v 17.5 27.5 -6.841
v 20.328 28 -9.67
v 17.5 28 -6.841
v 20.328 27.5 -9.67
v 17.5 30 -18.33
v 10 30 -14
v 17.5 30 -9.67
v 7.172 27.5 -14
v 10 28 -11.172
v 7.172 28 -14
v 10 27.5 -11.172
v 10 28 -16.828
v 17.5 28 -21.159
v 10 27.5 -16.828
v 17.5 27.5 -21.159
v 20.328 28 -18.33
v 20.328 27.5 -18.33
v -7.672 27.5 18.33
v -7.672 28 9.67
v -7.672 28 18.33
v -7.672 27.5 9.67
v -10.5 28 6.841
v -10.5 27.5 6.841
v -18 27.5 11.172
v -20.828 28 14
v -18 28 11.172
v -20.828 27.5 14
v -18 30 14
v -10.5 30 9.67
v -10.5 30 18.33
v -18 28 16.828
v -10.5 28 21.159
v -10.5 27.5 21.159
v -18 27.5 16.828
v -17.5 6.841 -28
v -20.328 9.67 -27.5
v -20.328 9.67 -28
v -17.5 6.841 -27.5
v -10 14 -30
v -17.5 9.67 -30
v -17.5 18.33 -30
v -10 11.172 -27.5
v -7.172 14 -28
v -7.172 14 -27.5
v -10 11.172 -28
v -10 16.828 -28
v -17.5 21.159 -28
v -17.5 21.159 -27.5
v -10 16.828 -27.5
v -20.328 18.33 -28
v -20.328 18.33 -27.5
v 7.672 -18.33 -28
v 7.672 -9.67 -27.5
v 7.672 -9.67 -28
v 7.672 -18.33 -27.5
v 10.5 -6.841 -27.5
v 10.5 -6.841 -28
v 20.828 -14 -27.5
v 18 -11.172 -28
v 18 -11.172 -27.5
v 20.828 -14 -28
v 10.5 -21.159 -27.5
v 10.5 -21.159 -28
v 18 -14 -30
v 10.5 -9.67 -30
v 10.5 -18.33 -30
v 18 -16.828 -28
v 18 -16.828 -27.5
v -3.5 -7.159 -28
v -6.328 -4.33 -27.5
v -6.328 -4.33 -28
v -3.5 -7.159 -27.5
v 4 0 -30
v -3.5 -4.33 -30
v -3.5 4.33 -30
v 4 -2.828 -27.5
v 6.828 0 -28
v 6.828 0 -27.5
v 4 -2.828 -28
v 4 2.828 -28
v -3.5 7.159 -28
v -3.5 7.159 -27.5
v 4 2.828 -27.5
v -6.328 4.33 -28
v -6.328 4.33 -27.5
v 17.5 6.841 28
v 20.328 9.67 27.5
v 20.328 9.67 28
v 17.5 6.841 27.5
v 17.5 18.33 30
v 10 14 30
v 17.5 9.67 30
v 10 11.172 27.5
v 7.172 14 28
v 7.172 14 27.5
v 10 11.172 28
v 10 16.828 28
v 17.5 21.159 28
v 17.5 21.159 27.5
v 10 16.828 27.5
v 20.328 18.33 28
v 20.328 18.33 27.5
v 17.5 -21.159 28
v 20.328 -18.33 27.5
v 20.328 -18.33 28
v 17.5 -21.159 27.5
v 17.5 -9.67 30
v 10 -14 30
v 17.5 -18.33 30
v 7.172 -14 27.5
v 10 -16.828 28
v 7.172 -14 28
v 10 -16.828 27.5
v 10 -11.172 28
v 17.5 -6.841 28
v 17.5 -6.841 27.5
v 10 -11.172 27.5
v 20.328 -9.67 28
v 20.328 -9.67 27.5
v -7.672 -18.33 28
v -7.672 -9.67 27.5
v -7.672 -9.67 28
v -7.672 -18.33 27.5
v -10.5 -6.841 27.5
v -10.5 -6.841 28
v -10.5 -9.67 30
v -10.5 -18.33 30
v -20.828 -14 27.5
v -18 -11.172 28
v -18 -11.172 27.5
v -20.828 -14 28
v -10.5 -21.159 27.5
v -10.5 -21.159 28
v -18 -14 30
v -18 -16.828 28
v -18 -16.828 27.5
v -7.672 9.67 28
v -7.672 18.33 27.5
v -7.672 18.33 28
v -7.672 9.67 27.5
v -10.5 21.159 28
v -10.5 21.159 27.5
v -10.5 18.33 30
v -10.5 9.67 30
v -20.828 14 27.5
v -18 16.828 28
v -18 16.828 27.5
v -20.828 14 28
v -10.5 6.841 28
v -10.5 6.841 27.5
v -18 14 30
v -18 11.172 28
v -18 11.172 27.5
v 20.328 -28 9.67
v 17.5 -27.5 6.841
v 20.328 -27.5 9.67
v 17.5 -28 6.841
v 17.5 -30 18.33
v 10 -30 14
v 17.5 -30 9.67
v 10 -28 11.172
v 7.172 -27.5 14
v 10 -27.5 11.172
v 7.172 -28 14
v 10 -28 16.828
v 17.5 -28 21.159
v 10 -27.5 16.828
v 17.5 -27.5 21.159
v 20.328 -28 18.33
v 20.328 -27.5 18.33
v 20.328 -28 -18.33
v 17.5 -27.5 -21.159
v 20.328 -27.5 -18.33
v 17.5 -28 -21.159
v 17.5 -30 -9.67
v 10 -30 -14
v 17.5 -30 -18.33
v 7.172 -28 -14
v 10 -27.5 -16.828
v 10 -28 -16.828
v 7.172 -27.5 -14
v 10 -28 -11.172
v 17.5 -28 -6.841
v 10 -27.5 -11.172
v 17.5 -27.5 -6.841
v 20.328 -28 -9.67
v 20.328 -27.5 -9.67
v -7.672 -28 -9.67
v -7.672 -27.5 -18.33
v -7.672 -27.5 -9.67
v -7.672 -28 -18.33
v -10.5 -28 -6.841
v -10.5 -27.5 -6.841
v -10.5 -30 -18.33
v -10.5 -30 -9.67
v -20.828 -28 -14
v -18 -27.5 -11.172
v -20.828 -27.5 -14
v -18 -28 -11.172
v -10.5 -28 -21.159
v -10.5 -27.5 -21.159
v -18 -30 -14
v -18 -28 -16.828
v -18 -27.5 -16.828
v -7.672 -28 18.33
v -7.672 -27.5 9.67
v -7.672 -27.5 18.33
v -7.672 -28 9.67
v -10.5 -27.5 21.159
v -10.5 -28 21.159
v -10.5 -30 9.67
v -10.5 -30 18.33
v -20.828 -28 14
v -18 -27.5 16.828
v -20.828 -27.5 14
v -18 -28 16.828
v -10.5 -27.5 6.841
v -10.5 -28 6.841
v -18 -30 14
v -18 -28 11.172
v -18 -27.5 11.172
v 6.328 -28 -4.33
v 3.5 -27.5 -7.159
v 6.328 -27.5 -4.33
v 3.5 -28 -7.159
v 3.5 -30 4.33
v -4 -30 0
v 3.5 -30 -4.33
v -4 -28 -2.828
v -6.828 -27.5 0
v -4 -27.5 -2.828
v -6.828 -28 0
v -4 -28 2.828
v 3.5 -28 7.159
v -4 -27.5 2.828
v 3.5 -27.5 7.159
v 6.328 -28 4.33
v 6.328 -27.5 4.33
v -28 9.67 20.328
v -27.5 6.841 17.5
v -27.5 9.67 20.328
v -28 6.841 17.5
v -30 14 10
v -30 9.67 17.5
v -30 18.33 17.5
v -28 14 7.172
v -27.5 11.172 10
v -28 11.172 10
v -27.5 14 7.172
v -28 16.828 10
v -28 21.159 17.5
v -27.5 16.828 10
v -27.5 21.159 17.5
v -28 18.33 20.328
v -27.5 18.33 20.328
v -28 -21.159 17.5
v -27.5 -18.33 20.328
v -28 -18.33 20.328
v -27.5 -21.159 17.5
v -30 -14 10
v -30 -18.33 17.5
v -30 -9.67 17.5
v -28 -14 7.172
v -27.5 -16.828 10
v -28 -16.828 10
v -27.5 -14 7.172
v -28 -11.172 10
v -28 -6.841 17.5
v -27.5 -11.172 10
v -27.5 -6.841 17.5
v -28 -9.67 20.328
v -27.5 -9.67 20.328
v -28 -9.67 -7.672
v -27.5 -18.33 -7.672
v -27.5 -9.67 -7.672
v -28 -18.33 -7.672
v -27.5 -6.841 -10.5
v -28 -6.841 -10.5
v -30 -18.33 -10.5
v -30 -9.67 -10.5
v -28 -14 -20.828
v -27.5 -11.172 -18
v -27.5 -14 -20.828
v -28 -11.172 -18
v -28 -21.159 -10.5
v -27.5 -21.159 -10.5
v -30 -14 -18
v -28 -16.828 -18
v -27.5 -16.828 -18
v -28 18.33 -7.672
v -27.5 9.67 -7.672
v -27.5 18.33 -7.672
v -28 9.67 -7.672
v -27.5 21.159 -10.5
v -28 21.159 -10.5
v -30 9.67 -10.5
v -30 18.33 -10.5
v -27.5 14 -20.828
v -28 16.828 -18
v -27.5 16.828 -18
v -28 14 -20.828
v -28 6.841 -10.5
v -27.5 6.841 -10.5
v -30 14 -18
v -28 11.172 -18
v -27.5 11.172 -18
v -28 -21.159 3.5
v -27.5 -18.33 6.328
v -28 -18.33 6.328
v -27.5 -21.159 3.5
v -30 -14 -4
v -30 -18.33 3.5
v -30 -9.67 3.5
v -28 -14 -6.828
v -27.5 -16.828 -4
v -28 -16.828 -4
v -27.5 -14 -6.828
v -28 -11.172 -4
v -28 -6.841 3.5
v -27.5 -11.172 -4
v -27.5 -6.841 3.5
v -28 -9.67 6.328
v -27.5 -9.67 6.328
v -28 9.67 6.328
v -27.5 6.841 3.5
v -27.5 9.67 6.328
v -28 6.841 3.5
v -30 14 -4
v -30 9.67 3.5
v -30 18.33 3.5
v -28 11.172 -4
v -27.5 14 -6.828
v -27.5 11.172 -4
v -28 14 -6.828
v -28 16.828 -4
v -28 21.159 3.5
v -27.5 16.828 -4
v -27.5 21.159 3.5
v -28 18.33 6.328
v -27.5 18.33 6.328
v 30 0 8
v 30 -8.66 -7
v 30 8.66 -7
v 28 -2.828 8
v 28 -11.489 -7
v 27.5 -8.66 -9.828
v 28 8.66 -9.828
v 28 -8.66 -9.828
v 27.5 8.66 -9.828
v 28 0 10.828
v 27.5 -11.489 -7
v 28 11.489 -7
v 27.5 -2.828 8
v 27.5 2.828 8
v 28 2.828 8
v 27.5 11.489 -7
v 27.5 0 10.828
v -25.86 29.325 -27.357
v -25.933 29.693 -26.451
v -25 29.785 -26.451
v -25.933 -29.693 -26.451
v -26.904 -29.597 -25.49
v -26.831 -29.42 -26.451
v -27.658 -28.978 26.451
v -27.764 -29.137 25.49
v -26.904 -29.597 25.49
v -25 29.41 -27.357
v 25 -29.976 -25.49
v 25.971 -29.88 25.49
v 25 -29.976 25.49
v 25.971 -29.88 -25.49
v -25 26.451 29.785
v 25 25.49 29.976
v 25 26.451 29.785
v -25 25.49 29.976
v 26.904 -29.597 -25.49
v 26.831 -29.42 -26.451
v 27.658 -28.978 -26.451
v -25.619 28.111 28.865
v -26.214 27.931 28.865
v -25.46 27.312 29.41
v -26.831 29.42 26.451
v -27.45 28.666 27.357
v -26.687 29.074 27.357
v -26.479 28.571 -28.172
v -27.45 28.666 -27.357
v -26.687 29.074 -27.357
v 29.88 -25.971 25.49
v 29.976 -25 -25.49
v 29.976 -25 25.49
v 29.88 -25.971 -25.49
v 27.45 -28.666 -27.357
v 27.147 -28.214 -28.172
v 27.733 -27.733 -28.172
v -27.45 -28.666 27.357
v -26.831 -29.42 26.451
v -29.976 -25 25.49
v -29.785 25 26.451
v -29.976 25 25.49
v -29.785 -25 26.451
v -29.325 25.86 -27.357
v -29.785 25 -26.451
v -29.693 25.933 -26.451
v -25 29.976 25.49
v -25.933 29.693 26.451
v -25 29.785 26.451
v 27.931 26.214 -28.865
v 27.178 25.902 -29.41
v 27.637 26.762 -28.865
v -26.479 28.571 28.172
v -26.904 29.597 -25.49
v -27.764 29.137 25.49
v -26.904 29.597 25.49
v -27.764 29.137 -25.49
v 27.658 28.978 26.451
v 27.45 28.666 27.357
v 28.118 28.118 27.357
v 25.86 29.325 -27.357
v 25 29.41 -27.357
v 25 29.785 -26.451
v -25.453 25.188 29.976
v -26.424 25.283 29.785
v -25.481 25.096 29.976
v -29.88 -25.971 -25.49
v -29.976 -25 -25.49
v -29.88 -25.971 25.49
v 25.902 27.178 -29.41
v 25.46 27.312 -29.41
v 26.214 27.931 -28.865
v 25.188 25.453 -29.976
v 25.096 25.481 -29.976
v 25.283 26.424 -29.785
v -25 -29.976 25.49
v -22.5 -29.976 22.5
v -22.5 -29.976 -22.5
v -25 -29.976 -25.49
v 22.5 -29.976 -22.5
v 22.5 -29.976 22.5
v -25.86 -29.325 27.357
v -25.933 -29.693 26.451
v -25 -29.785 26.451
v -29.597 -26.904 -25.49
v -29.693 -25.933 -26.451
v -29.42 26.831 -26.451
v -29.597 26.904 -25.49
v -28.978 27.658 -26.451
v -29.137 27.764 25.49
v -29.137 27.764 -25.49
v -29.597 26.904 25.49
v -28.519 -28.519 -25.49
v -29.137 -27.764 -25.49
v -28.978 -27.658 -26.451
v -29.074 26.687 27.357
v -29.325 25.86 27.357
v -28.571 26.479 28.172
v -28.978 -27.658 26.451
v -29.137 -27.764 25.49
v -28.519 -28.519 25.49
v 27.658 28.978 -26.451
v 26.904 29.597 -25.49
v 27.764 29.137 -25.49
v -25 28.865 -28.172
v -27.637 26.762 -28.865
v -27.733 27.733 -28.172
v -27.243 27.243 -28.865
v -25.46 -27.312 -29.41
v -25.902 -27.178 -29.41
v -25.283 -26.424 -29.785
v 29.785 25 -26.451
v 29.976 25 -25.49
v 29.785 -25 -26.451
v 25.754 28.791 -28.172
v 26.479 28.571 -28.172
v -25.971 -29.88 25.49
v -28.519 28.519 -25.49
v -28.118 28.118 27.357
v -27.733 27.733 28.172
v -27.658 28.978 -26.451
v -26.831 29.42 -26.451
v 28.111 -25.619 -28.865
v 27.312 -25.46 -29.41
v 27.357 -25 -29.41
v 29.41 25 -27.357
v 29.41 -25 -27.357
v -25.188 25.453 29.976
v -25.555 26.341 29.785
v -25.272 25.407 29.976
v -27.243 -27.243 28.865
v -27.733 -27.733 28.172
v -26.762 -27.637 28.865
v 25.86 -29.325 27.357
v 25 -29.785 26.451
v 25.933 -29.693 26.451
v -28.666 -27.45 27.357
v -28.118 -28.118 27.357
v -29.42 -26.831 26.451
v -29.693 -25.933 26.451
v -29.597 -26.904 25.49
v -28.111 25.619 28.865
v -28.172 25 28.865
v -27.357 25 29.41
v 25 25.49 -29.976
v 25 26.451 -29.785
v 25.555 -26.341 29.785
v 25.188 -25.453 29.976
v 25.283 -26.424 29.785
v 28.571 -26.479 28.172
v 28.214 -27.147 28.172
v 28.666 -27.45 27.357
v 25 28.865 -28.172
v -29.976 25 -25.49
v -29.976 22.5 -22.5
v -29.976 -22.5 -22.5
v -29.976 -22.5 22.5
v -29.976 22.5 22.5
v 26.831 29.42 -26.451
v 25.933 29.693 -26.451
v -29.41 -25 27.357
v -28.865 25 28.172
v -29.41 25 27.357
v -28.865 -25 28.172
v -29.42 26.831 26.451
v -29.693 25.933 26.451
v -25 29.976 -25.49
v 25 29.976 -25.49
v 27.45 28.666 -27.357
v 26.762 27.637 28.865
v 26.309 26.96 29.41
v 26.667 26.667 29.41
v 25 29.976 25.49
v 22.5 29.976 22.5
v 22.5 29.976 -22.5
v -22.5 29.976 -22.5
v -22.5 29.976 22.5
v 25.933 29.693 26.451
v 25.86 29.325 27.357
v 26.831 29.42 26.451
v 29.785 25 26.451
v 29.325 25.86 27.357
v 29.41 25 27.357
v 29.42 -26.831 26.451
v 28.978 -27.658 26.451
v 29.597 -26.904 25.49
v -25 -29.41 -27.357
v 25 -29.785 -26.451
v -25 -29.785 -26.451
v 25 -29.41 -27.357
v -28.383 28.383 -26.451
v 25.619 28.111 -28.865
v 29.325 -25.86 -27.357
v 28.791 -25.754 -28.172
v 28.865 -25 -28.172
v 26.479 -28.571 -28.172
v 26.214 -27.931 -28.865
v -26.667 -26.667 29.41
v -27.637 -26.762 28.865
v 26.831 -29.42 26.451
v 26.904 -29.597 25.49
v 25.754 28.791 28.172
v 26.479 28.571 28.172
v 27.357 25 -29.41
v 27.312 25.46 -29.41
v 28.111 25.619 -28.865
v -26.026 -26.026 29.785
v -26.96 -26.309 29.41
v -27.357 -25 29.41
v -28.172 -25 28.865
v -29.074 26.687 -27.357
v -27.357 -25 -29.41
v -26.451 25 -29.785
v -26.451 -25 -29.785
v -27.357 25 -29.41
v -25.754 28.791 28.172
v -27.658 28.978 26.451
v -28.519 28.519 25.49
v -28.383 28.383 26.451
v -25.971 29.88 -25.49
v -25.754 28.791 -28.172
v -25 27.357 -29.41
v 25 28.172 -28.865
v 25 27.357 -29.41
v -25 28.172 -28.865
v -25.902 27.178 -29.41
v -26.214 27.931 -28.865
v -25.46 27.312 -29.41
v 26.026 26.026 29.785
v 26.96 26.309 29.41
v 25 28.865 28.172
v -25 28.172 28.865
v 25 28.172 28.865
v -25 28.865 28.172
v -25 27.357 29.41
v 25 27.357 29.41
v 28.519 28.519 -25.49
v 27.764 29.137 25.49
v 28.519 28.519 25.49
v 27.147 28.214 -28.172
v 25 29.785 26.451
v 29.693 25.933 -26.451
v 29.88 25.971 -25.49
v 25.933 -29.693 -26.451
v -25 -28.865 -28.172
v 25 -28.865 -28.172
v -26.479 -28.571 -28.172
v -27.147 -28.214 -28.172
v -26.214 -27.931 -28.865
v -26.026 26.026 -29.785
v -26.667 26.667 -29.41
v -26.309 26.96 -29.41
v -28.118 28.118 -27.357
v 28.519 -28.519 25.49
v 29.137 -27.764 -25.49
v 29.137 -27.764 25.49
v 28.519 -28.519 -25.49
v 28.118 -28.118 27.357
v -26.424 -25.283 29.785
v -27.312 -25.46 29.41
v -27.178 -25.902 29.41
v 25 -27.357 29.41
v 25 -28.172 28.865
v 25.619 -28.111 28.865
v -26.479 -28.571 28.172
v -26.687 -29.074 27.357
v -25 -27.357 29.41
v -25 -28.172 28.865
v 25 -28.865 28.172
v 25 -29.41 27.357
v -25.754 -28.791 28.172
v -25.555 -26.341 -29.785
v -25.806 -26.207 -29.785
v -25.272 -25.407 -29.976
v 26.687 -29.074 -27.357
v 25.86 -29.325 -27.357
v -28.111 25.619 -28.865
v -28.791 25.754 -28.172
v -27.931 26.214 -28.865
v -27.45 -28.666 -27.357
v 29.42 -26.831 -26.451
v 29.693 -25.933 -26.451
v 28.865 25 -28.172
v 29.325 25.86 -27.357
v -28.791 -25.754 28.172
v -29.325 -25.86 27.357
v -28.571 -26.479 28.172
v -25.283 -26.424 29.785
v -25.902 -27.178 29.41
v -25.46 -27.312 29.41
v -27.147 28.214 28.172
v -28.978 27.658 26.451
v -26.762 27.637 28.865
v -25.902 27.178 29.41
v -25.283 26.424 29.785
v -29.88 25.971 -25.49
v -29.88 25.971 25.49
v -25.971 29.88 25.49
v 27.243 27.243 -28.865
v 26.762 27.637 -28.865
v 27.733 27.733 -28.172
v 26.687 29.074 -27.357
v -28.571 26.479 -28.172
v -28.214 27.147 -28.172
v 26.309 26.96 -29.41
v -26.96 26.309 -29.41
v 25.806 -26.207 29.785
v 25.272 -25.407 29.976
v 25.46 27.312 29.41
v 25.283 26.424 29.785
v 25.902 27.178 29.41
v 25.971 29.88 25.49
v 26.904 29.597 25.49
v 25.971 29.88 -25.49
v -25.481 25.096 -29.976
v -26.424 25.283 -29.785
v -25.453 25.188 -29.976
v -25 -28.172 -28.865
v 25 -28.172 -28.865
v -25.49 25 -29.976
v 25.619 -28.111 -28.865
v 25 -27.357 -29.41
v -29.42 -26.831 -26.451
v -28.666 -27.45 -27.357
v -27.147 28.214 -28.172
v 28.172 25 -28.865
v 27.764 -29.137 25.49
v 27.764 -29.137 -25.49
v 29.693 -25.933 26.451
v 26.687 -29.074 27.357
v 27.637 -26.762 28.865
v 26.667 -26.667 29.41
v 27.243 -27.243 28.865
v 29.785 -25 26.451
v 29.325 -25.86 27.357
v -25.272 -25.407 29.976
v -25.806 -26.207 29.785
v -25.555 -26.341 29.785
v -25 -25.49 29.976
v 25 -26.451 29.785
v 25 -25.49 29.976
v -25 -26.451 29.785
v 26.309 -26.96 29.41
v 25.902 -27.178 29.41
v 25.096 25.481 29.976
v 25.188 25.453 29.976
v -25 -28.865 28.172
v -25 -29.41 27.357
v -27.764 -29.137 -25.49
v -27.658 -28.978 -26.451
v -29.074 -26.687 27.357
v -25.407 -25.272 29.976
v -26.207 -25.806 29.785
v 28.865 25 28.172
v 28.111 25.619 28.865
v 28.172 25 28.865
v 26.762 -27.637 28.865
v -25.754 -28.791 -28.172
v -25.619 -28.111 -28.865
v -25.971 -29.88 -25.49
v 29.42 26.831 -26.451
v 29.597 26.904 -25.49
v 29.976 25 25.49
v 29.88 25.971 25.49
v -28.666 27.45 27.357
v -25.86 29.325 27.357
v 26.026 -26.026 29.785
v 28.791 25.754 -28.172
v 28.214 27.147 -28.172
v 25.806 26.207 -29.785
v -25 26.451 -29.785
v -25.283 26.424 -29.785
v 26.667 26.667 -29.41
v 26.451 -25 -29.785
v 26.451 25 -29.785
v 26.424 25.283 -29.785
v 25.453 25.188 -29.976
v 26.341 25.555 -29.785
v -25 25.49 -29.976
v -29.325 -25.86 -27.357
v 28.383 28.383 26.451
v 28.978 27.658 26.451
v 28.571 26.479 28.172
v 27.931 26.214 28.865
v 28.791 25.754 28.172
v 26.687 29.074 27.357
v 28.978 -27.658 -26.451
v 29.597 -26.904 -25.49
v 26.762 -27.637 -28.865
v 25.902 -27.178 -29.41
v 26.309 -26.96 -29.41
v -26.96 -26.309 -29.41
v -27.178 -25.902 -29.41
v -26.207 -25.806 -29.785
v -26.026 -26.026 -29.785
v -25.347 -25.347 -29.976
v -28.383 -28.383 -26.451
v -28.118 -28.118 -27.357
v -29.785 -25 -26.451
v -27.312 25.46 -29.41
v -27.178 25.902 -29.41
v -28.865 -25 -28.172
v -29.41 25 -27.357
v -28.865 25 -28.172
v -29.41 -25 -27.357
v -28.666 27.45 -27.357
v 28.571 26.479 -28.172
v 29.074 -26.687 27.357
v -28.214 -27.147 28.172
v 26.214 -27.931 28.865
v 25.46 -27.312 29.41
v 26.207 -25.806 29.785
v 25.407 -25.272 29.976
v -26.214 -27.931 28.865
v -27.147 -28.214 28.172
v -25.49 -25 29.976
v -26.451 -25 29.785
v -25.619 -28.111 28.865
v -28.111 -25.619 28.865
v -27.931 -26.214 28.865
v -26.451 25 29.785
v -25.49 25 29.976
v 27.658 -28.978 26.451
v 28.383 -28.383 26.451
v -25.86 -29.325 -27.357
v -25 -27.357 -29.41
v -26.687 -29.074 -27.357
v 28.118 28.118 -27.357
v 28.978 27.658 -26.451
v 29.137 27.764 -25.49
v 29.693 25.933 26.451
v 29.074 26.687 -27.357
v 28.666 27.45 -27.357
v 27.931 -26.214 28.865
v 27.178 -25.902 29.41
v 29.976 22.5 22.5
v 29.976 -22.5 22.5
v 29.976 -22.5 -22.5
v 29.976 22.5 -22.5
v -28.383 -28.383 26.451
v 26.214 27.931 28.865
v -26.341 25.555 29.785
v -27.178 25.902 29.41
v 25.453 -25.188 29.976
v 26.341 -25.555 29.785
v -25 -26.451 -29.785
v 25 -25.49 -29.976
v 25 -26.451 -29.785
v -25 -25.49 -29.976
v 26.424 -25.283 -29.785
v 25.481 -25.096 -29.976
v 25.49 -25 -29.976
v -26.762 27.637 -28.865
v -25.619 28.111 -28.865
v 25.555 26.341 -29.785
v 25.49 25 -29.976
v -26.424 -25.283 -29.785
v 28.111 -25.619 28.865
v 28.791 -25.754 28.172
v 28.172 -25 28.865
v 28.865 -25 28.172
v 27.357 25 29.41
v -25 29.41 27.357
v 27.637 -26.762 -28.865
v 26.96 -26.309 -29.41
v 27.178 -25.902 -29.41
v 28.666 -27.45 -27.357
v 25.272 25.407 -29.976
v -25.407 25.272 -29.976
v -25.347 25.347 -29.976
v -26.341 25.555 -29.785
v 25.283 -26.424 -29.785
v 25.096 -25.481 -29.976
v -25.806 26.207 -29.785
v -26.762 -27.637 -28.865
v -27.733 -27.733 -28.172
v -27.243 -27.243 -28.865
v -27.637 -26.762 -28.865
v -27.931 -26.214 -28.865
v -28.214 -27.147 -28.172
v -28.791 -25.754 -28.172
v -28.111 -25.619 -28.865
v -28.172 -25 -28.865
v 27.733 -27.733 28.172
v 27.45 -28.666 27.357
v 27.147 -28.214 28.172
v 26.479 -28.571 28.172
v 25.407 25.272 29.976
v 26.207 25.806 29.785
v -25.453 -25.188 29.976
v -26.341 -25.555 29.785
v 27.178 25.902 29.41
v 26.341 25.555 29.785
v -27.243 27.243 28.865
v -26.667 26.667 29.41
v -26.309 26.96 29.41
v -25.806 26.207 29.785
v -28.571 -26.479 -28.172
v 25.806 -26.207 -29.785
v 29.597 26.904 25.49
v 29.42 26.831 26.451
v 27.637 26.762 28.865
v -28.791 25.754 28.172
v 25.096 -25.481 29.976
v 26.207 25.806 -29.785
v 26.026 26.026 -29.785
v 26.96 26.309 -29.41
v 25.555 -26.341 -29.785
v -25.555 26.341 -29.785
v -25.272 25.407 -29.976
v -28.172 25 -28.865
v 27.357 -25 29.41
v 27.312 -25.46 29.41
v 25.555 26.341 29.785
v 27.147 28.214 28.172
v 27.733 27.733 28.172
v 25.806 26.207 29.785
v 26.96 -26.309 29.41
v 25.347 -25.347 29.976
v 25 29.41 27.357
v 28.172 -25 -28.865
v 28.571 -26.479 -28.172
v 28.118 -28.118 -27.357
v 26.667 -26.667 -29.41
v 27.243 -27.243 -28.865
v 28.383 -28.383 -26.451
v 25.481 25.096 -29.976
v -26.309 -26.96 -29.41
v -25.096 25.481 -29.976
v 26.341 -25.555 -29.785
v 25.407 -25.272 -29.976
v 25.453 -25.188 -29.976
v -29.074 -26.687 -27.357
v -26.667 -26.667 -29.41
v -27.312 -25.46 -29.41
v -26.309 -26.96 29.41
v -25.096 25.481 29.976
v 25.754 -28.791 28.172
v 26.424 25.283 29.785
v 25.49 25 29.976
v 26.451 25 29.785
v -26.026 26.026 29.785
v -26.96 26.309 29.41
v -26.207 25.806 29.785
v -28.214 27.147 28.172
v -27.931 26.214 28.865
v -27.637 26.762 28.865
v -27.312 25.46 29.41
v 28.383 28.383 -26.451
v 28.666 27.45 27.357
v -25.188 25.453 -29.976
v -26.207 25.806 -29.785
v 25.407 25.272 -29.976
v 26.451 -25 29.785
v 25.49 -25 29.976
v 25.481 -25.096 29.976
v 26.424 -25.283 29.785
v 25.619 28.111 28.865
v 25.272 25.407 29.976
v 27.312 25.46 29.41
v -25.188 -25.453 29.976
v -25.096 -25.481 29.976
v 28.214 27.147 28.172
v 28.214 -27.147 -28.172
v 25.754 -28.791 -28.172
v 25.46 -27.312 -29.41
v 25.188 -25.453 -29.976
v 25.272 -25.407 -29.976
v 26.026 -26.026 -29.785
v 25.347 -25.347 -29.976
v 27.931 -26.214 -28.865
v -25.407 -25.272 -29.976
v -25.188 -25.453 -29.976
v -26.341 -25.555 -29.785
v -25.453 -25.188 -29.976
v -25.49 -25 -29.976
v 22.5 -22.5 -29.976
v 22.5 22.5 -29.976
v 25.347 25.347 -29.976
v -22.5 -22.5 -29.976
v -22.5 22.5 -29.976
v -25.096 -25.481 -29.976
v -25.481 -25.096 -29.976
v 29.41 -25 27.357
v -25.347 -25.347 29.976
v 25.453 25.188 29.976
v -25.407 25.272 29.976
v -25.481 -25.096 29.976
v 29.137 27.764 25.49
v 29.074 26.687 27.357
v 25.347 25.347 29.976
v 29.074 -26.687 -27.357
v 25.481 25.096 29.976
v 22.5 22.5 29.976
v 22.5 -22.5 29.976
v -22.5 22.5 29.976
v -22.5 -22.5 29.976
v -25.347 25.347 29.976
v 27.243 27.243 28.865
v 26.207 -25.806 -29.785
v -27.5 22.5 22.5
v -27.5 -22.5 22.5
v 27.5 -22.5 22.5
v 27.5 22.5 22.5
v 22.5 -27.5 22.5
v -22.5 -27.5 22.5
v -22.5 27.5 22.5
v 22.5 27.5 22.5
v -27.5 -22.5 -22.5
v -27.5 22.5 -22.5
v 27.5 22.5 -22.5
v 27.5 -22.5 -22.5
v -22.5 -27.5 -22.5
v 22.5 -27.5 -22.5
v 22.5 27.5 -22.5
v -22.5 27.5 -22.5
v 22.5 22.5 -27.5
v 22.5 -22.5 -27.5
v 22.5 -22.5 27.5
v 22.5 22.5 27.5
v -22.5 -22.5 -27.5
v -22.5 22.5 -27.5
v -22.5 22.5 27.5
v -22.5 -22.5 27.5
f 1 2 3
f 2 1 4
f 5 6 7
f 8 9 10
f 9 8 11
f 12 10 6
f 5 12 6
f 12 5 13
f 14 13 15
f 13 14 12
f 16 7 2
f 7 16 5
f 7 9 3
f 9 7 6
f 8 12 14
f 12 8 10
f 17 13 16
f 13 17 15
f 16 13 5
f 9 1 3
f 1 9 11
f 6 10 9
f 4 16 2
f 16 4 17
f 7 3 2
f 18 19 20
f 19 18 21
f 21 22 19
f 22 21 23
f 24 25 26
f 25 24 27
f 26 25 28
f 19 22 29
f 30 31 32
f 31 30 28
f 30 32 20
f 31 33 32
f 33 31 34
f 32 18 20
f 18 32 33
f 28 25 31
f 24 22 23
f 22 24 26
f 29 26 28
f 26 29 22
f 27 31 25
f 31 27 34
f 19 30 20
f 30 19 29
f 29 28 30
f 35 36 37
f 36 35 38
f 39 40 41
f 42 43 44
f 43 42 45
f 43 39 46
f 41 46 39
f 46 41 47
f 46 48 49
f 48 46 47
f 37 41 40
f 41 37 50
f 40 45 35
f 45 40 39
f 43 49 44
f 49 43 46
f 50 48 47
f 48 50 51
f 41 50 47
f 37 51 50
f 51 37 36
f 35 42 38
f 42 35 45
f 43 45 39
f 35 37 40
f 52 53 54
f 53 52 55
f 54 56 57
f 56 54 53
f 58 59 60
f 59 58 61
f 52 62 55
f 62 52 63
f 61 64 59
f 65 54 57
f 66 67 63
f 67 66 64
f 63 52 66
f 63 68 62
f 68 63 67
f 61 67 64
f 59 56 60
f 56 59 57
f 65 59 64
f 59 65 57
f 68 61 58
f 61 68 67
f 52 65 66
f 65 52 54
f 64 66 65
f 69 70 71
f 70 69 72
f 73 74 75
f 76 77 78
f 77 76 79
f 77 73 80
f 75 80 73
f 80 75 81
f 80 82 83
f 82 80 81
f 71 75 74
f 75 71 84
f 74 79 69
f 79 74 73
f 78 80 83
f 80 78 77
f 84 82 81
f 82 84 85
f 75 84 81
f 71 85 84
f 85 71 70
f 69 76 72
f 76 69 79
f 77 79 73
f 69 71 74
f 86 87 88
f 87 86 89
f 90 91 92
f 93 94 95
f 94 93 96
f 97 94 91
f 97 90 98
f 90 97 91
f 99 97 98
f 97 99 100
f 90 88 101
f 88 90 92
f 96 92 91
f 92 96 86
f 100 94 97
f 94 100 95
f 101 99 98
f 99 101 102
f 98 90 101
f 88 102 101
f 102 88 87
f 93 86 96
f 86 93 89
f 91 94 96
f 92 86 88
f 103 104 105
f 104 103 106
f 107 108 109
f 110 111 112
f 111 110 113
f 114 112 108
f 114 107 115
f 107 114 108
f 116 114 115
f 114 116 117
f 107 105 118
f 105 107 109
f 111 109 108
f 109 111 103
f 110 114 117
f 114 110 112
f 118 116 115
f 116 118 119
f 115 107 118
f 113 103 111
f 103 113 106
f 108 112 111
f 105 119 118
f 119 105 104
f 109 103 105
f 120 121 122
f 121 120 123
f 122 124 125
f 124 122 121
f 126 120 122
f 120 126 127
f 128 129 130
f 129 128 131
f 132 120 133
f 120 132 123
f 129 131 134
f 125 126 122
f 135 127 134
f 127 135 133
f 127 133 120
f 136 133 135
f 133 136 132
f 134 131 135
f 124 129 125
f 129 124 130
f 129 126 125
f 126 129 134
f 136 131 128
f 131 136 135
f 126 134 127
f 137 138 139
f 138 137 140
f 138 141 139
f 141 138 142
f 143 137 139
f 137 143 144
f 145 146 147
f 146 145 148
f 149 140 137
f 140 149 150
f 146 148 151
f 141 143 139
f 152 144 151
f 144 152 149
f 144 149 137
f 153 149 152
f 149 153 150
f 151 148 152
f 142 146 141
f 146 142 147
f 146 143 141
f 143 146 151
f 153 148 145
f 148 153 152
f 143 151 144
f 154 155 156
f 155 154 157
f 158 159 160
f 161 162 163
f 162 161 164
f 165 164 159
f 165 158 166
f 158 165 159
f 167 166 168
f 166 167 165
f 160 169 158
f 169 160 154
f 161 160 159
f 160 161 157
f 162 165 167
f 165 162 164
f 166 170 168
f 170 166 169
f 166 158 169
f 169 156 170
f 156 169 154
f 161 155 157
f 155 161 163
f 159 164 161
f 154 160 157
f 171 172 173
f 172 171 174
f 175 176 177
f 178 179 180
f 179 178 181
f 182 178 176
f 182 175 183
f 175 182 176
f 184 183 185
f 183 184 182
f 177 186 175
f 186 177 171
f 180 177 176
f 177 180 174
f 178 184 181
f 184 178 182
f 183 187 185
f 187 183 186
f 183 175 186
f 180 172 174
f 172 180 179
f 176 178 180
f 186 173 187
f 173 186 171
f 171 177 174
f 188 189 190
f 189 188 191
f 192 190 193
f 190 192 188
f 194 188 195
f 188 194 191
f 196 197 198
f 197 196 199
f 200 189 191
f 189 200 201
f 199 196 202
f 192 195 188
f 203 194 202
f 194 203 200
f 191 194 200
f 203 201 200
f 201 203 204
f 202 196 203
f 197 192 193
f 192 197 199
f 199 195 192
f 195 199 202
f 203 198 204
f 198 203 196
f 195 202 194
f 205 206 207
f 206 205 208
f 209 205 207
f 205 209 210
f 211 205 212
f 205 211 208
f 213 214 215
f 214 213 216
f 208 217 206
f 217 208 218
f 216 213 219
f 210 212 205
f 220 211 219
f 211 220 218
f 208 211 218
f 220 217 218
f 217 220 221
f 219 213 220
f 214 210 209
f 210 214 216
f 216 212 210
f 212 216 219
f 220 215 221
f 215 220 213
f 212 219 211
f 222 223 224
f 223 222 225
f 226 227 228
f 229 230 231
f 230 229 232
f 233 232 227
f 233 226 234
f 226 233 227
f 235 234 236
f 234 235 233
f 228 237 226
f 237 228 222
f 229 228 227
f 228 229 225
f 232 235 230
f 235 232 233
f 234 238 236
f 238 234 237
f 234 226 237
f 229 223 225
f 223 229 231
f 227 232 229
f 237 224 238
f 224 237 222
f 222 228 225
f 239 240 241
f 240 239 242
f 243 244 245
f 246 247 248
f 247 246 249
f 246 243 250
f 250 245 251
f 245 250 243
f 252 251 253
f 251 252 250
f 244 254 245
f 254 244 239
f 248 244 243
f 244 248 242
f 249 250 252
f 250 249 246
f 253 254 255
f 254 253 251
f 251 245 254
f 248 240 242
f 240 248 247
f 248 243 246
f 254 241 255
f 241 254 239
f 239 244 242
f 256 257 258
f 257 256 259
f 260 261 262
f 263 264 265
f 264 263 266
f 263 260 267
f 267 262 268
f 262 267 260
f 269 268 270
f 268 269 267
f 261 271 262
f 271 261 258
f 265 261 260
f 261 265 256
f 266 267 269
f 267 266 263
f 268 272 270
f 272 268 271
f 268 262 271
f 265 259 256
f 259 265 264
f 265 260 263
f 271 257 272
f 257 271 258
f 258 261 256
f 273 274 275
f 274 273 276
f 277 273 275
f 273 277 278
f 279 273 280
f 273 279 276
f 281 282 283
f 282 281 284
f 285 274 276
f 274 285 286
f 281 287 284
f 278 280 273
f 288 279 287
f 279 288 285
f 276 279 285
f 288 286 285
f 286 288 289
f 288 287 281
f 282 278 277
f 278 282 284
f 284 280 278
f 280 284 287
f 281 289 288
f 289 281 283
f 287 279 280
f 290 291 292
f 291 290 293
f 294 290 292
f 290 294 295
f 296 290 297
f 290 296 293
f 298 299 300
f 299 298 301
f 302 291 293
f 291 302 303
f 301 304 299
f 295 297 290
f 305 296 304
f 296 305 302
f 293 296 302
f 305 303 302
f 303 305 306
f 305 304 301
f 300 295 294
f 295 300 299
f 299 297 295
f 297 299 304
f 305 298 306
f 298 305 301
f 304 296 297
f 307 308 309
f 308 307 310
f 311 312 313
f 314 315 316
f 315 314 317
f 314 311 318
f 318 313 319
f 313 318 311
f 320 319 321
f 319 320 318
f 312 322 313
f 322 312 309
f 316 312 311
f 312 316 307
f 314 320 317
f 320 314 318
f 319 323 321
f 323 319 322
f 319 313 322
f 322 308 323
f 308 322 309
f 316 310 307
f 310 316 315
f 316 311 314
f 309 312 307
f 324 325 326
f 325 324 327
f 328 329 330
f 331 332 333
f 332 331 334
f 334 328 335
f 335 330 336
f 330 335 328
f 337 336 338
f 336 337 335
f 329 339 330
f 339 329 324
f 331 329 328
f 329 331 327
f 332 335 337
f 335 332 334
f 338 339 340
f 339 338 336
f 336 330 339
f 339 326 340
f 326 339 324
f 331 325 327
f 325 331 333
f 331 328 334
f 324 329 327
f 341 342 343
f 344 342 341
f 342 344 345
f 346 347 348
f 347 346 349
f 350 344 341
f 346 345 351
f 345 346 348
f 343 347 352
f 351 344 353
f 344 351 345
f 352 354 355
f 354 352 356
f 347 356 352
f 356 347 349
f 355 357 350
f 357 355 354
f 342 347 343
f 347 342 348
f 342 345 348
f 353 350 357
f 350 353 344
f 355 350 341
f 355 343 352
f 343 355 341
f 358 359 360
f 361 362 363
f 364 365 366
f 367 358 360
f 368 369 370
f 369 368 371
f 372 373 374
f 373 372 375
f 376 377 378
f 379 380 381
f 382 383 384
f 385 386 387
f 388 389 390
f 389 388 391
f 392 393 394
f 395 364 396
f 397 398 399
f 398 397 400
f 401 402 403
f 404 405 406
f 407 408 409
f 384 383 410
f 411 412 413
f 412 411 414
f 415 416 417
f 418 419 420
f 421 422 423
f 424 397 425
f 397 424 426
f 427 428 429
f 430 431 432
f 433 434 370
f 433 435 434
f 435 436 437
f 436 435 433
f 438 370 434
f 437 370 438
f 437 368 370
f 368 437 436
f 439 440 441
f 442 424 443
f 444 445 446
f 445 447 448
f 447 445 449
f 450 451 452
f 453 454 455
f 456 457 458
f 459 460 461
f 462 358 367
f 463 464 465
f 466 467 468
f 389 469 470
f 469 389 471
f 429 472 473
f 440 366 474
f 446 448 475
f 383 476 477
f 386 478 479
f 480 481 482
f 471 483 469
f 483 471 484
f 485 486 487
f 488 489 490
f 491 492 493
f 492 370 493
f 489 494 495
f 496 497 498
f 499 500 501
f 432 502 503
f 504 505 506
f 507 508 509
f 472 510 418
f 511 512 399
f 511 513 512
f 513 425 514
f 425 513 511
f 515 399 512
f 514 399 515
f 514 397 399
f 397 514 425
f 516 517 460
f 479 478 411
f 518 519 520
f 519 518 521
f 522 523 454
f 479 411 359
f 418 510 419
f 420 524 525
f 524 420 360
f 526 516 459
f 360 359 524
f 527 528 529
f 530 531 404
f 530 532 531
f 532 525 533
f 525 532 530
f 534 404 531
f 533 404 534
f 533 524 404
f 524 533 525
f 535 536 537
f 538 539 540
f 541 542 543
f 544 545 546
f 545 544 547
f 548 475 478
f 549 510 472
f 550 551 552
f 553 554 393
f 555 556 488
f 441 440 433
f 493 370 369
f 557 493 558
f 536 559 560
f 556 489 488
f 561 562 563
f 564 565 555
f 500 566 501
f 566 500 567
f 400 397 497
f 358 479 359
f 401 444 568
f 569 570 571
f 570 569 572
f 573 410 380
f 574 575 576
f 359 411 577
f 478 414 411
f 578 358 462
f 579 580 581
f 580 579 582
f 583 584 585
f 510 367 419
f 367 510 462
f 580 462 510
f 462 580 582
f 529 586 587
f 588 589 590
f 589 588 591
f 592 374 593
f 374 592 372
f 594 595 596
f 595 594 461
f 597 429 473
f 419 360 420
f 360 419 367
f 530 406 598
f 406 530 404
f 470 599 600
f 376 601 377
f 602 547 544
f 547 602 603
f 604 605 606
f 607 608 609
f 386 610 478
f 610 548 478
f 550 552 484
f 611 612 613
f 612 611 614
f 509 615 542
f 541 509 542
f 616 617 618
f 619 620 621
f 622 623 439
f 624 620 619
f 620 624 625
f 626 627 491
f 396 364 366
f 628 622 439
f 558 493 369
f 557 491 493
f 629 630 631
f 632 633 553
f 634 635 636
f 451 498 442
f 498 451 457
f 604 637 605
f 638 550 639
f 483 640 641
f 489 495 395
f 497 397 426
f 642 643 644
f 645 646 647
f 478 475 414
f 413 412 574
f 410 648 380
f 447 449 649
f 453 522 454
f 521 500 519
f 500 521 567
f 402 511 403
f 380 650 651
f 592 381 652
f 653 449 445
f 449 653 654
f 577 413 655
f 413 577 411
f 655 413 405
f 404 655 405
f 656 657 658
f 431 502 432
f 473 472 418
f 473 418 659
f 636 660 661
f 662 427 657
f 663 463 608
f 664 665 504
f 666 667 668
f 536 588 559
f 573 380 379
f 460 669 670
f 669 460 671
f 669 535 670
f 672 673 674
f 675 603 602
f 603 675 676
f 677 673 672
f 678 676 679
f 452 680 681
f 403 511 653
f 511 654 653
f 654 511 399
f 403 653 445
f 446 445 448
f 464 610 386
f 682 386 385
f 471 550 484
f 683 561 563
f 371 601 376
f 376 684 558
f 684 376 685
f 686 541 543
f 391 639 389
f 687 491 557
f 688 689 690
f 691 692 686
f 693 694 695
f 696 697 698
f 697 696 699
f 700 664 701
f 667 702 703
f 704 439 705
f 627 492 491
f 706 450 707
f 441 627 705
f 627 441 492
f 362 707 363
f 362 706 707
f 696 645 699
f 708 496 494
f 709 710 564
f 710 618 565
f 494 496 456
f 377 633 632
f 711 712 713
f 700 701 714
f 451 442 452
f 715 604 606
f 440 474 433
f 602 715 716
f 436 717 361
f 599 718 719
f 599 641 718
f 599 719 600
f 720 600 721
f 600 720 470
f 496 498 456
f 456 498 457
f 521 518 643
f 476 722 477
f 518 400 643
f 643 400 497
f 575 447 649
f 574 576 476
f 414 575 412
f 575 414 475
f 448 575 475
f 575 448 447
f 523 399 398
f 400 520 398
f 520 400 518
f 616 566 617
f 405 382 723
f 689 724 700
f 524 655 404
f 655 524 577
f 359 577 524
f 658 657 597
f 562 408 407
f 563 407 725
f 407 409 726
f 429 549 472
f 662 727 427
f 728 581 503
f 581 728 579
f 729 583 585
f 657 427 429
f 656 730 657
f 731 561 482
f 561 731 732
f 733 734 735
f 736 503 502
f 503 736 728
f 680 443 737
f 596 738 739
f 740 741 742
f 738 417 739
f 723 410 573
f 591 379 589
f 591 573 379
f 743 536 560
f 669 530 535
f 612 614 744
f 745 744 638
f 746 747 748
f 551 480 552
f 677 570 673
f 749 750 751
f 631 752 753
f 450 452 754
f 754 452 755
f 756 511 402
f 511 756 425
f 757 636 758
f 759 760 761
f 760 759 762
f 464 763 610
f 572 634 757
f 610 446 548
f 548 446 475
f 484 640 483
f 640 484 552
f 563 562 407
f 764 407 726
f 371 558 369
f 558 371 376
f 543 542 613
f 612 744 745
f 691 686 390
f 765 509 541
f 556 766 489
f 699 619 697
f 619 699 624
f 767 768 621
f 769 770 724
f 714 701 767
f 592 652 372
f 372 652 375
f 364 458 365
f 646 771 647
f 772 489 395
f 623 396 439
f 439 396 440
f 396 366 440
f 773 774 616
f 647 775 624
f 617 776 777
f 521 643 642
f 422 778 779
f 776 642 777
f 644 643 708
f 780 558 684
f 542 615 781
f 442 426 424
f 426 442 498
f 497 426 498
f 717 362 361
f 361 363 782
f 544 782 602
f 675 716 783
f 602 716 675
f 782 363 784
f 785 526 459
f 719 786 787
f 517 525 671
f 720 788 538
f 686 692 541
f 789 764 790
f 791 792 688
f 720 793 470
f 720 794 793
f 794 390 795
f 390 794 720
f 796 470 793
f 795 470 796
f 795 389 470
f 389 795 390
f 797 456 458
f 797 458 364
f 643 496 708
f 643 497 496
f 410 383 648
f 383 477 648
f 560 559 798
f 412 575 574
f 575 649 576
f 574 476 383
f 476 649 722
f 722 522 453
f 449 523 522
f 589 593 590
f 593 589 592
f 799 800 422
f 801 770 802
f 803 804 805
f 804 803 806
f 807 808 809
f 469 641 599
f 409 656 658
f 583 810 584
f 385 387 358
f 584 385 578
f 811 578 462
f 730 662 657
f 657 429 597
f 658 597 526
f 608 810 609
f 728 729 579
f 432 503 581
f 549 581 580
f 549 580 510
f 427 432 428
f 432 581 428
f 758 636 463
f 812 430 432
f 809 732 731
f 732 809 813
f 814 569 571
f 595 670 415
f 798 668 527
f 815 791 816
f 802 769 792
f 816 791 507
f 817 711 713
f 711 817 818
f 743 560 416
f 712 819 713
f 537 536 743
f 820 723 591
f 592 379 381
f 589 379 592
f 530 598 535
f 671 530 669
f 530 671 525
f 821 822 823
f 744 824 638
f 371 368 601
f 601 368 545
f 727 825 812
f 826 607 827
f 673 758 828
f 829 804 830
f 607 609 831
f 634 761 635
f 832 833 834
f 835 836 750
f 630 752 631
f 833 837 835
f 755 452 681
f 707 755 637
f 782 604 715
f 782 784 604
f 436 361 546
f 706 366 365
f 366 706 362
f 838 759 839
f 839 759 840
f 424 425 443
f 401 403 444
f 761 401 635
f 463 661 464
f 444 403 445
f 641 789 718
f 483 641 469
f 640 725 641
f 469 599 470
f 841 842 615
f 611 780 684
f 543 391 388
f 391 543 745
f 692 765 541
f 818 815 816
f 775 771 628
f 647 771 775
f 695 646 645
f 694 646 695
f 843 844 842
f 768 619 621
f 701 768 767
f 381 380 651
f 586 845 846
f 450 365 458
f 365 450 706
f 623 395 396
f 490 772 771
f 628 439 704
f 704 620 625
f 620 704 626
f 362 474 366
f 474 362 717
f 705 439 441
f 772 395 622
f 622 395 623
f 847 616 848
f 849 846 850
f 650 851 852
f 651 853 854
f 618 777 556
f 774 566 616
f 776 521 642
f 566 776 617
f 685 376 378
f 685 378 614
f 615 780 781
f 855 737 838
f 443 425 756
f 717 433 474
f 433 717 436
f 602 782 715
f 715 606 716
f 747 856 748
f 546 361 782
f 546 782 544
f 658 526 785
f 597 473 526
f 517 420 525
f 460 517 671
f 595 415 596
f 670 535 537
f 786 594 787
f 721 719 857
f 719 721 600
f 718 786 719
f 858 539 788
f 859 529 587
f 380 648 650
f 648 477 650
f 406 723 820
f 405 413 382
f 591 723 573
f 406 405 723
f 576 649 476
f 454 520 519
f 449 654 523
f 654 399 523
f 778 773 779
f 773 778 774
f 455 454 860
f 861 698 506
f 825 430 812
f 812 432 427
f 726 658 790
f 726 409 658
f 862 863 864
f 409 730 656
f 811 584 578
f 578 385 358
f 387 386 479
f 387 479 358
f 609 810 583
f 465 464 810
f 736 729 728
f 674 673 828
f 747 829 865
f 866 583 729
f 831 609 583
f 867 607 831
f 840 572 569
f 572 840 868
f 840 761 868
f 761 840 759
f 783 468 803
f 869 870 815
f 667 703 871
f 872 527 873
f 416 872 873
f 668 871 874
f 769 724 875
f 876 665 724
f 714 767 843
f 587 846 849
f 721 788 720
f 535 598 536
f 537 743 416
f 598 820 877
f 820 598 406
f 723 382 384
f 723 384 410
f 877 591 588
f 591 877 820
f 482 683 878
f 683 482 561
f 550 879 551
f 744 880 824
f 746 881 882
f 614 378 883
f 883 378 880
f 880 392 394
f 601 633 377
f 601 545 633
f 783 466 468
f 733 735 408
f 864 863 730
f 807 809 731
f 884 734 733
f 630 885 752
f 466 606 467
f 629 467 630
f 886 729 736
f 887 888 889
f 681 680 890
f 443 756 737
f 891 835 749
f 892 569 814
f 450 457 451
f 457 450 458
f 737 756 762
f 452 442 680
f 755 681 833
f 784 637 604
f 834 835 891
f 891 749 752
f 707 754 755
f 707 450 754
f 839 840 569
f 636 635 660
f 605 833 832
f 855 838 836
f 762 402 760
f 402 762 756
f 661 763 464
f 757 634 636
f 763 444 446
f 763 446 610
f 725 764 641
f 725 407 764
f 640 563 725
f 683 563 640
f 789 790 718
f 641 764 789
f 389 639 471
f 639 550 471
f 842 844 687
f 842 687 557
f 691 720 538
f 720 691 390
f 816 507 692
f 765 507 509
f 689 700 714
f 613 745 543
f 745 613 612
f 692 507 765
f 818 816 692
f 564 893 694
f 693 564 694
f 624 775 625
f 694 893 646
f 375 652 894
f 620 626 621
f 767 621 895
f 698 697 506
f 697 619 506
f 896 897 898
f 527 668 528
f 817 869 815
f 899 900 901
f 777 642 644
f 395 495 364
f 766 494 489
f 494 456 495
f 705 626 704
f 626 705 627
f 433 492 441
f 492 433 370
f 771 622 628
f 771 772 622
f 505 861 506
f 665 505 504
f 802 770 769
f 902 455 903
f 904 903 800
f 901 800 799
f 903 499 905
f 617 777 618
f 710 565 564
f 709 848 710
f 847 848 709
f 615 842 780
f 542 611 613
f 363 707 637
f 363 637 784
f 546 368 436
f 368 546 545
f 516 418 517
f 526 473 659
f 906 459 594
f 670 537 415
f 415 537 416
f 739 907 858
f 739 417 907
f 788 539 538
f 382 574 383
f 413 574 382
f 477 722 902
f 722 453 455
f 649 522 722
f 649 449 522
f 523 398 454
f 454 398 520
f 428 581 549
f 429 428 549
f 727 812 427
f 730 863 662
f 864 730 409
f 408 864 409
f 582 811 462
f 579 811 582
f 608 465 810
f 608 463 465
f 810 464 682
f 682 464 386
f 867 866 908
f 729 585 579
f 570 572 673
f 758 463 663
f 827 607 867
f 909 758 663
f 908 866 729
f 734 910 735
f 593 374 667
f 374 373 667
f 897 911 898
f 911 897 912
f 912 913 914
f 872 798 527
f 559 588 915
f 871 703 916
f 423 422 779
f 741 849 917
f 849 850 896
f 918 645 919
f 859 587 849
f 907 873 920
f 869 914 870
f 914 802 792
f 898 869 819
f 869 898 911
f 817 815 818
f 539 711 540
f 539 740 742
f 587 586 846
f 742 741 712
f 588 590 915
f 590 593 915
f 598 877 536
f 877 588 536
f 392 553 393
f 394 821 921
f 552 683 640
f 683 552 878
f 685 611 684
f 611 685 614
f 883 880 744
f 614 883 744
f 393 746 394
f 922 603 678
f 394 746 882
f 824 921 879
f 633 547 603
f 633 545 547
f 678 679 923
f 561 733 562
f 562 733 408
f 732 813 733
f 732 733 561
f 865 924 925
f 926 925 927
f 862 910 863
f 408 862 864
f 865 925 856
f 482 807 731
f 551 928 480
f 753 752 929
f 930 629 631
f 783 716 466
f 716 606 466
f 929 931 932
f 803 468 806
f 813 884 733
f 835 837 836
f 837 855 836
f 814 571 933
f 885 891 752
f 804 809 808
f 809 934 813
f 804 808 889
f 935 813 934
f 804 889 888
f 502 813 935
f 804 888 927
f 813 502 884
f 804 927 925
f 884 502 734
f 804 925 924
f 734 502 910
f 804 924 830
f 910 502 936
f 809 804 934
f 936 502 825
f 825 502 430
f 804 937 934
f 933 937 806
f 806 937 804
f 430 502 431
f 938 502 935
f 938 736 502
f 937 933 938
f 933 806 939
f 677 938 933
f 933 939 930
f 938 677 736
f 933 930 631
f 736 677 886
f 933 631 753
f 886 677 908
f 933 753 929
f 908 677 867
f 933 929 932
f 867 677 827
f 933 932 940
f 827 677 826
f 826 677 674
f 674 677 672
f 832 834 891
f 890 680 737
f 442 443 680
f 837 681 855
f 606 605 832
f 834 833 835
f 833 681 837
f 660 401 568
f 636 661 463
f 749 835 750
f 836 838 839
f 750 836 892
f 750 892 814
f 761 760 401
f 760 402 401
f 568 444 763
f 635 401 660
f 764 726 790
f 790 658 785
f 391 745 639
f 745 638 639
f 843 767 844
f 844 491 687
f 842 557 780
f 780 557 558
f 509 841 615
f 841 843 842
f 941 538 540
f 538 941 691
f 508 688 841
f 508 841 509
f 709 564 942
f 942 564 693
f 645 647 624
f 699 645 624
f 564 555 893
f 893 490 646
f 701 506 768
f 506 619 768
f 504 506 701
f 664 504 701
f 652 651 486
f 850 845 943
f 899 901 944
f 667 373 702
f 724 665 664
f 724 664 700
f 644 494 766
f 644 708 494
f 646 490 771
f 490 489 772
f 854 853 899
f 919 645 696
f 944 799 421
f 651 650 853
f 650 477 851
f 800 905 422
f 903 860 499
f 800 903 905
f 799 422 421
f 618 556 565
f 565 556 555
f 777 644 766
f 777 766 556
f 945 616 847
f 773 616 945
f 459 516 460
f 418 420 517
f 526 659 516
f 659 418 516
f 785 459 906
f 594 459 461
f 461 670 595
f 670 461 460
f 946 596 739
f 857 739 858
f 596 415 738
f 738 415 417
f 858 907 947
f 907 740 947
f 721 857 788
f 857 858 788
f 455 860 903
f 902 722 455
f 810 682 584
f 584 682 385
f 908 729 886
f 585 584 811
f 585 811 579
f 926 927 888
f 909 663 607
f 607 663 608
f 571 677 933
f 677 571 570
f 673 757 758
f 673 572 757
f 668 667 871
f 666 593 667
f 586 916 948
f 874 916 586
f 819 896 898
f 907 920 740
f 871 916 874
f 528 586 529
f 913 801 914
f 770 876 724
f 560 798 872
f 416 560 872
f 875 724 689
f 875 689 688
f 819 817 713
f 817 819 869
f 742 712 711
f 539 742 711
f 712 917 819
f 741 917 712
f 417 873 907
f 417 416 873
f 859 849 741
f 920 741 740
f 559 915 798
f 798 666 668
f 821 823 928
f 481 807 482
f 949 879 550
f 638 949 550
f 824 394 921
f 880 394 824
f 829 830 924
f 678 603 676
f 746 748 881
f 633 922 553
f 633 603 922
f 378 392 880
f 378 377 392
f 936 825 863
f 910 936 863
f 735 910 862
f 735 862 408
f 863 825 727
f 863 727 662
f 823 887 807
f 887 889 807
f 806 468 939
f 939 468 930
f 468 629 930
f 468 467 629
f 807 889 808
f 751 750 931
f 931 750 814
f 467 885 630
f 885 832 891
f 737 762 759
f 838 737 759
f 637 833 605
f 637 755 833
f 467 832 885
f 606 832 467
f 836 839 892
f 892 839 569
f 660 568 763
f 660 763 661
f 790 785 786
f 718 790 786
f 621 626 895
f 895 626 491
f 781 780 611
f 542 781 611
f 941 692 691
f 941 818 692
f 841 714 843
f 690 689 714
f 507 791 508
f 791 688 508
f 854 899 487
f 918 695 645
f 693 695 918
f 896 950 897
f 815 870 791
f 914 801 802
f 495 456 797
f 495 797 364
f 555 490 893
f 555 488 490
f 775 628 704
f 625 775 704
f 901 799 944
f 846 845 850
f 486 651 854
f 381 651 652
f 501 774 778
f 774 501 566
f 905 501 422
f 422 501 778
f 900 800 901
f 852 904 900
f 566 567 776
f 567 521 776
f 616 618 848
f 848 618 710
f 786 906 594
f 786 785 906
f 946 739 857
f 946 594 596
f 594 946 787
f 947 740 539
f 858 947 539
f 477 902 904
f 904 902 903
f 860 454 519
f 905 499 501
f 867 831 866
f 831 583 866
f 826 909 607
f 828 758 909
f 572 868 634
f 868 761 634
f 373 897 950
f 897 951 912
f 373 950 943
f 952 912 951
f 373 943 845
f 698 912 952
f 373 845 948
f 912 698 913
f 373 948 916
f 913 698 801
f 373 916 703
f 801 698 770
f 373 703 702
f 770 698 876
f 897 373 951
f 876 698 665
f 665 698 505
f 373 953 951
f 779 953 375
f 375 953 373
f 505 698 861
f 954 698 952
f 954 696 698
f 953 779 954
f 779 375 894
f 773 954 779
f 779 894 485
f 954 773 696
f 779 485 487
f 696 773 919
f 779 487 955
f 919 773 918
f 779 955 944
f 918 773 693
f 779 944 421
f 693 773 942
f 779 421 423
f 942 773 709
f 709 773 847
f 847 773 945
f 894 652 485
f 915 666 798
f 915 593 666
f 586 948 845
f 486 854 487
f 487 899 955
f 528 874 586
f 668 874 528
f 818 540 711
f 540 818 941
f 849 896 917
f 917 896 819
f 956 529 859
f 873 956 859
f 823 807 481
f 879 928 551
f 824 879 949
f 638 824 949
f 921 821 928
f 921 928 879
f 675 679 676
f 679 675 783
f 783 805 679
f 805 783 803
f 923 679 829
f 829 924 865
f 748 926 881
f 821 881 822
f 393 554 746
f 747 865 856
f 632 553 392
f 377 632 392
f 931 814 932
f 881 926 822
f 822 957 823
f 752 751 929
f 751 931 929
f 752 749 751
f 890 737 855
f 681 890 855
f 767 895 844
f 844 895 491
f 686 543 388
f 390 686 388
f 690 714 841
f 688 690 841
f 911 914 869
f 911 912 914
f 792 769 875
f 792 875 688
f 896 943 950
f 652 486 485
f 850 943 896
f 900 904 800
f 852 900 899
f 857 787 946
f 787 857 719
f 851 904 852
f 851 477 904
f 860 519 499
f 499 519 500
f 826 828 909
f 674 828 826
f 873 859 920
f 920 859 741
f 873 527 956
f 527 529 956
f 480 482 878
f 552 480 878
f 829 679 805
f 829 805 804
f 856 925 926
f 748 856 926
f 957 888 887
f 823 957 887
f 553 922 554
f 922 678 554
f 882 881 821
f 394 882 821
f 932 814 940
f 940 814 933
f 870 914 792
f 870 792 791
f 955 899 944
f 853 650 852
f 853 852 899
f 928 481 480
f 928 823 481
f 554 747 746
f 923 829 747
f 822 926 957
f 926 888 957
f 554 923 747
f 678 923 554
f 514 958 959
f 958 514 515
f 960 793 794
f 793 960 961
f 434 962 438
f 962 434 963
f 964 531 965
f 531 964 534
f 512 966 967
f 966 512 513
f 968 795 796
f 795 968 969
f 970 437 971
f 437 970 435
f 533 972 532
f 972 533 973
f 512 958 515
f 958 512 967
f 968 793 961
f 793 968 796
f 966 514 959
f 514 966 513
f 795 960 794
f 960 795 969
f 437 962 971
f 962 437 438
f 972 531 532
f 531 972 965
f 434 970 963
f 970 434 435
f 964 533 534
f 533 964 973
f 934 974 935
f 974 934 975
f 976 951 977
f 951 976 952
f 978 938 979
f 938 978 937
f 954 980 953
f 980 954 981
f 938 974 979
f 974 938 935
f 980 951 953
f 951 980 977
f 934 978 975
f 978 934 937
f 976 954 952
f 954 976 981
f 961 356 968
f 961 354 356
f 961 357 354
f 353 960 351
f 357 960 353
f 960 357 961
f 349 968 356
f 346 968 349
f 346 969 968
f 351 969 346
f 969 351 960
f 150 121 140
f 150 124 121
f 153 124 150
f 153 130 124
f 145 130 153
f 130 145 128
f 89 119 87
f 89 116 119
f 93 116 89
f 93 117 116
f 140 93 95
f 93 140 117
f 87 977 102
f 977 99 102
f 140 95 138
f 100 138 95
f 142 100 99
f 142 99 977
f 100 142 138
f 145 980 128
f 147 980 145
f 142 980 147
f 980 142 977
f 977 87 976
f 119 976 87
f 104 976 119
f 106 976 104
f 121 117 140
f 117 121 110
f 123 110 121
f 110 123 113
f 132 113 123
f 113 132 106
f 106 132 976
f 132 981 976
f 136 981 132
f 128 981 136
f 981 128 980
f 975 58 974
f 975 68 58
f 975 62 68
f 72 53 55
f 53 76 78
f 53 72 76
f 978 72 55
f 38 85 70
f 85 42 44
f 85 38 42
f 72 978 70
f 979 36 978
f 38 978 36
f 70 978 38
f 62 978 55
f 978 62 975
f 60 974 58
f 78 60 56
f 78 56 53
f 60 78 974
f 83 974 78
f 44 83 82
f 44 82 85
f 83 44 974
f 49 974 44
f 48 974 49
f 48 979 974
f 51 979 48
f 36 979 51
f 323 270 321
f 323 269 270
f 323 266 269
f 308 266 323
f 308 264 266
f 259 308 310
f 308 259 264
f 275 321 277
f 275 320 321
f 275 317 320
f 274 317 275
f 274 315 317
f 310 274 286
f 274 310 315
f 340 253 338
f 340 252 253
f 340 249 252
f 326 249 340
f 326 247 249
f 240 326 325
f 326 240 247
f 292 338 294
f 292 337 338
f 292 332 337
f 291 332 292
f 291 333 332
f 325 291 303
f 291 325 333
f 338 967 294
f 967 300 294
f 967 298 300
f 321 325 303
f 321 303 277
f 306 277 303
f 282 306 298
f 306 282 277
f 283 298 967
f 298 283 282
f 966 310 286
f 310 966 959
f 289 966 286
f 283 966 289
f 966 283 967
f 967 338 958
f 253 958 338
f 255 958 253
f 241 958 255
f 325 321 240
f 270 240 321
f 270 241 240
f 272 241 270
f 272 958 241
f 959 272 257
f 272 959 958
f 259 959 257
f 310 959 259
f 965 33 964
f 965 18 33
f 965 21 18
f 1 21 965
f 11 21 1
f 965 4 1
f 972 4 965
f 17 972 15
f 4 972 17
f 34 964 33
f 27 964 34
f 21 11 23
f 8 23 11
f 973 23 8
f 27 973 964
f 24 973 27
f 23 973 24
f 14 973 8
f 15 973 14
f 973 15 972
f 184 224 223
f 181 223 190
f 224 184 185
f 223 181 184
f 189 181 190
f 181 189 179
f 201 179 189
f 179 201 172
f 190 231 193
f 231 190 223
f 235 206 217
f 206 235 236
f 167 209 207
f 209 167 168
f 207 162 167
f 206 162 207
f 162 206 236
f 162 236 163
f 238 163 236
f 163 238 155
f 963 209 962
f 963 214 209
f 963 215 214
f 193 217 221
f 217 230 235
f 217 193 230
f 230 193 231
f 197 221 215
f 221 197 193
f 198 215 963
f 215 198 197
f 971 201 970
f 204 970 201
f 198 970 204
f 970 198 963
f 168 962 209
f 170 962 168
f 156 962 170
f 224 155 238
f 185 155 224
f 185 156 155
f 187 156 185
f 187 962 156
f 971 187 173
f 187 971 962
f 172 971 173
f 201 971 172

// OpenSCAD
module octahedron() {
    module cutter() {
        translate([-50, -50, 0]) cube([100, 100, 10]);
    }
    module do_cut() {
        translate([0, 1, 0])
        rotate([-45, 0, 0])
        cutter();
        translate([0, -1, 0])
        rotate([45, 0, 0])
        cutter();
        translate([0, 1, 0])
        rotate([-45-90, 0, 0])
        cutter();
        translate([0, -1, 0])
        rotate([45+90, 0, 0])
        cutter();
    }
    difference() {
        cube([2, 2, 2], true);
        do_cut();
        rotate([0, 0, 90]) do_cut();
    }
}

//    rotate([45, 0, 0]) translate([-.5, -.5, -.5]) polyhedron (points=[[0,0,0],[0,1,0],[0,1,1],[0,0,1],[1,0,0],[1,1,0],[1,1,1],[1,0,1]], faces=[[0,1,2,3],[4,5,6,7],[3,2,6,7],[1,5,6,2],[0,4,7,3],[0,1,5,4]]);
// polyhedron(points=[
//    [1,0,0],
//    [0,1,0],
//    [0,0,1],
//    [-1,0,0],
//    [0,-1,0],
//    [0,0,-1],
//    ], faces=[
//    [0,1,2],
//    [1,2,3],
//    [2,3,4],
//
//    ]);   


//minkowski() {
//    cube(30, center=true);
//    scale(5)
//    rotate([0, 0, 45]) octahedron();
//}
module pattern(nn, h=7.5, r=5, s=14) {
    
    module dot(scale=1) {
        translate([0, 0, -h/2]) minkowski() {
            
            scale([scale, scale, 1])
            translate([1, 0, 0])
            rotate([0, 0, 180])
            cylinder(h=h-4, r=r, center=true, $fn =3);
            // sphere(h=1, r=2, center=true, $fn=12);
            
            // rotate([0, 0, 0])
            // rotate([45, 0, 0])
            // cube([2, 2, 2], center=true);
            
            scale(2)
            rotate([0, 0, 45]) octahedron();
        }
    }
    if (nn == 1) {
        dot(2);
    } else if (nn == 2) {
       translate([s, s, 0]) dot();
       translate([-s, -s, 0]) dot();
    } else if (nn == 3) {
       translate([s, s, 0]) dot();
       translate([-s, -s, 0]) dot();
       dot();
    } else if (nn == 4) {
       translate([s, s, 0]) dot();
       translate([s, -s, 0]) dot();
       translate([-s, -s, 0]) dot();
       translate([-s, s, 0]) dot();
    } else if (nn == 5) {
       translate([s, s, 0]) dot();
       translate([s, -s, 0]) dot();
       translate([-s, -s, 0]) dot();
       translate([-s, s, 0]) dot();
       dot();
    } else if (nn == 6) {
       translate([s, s, 0]) dot();
       translate([s, -s, 0]) dot();
       translate([-s, -s, 0]) dot();
       translate([-s, s, 0]) dot();
       translate([0, -s, 0]) dot();
       translate([0, s, 0]) dot();
    }         

}


module dots() {
    rotate(90, [0, 1, 0])
    translate([0, 0, 30])
    pattern(1);
    
    rotate(-90, [1, 0, 0])
    translate([0, 0, 30])
    pattern(2);
    
    rotate(180, [0, 1, 0])
    translate([0, 0, 30])
    pattern(3);
    
    rotate(0, [0, 1, 0])
    translate([0, 0, 30])
    pattern(4);
    
    rotate(90, [1, 0, 0])
    translate([0, 0, 30])
    pattern(5);
    
    rotate(-90, [0, 1, 0])
    translate([0, 0, 30])
    pattern(6);
}



module main() {
    color("red") cube([55, 55, 55], center=true);
    dots();
    difference() {
        minkowski() {
            sphere(5, $fn=32);
            cube(50, center=true);
        }
        cube([70, 45, 45], center=true);
        cube([45, 70, 45], center=true);
        cube([45, 45, 70], center=true);
    }
}

main();
